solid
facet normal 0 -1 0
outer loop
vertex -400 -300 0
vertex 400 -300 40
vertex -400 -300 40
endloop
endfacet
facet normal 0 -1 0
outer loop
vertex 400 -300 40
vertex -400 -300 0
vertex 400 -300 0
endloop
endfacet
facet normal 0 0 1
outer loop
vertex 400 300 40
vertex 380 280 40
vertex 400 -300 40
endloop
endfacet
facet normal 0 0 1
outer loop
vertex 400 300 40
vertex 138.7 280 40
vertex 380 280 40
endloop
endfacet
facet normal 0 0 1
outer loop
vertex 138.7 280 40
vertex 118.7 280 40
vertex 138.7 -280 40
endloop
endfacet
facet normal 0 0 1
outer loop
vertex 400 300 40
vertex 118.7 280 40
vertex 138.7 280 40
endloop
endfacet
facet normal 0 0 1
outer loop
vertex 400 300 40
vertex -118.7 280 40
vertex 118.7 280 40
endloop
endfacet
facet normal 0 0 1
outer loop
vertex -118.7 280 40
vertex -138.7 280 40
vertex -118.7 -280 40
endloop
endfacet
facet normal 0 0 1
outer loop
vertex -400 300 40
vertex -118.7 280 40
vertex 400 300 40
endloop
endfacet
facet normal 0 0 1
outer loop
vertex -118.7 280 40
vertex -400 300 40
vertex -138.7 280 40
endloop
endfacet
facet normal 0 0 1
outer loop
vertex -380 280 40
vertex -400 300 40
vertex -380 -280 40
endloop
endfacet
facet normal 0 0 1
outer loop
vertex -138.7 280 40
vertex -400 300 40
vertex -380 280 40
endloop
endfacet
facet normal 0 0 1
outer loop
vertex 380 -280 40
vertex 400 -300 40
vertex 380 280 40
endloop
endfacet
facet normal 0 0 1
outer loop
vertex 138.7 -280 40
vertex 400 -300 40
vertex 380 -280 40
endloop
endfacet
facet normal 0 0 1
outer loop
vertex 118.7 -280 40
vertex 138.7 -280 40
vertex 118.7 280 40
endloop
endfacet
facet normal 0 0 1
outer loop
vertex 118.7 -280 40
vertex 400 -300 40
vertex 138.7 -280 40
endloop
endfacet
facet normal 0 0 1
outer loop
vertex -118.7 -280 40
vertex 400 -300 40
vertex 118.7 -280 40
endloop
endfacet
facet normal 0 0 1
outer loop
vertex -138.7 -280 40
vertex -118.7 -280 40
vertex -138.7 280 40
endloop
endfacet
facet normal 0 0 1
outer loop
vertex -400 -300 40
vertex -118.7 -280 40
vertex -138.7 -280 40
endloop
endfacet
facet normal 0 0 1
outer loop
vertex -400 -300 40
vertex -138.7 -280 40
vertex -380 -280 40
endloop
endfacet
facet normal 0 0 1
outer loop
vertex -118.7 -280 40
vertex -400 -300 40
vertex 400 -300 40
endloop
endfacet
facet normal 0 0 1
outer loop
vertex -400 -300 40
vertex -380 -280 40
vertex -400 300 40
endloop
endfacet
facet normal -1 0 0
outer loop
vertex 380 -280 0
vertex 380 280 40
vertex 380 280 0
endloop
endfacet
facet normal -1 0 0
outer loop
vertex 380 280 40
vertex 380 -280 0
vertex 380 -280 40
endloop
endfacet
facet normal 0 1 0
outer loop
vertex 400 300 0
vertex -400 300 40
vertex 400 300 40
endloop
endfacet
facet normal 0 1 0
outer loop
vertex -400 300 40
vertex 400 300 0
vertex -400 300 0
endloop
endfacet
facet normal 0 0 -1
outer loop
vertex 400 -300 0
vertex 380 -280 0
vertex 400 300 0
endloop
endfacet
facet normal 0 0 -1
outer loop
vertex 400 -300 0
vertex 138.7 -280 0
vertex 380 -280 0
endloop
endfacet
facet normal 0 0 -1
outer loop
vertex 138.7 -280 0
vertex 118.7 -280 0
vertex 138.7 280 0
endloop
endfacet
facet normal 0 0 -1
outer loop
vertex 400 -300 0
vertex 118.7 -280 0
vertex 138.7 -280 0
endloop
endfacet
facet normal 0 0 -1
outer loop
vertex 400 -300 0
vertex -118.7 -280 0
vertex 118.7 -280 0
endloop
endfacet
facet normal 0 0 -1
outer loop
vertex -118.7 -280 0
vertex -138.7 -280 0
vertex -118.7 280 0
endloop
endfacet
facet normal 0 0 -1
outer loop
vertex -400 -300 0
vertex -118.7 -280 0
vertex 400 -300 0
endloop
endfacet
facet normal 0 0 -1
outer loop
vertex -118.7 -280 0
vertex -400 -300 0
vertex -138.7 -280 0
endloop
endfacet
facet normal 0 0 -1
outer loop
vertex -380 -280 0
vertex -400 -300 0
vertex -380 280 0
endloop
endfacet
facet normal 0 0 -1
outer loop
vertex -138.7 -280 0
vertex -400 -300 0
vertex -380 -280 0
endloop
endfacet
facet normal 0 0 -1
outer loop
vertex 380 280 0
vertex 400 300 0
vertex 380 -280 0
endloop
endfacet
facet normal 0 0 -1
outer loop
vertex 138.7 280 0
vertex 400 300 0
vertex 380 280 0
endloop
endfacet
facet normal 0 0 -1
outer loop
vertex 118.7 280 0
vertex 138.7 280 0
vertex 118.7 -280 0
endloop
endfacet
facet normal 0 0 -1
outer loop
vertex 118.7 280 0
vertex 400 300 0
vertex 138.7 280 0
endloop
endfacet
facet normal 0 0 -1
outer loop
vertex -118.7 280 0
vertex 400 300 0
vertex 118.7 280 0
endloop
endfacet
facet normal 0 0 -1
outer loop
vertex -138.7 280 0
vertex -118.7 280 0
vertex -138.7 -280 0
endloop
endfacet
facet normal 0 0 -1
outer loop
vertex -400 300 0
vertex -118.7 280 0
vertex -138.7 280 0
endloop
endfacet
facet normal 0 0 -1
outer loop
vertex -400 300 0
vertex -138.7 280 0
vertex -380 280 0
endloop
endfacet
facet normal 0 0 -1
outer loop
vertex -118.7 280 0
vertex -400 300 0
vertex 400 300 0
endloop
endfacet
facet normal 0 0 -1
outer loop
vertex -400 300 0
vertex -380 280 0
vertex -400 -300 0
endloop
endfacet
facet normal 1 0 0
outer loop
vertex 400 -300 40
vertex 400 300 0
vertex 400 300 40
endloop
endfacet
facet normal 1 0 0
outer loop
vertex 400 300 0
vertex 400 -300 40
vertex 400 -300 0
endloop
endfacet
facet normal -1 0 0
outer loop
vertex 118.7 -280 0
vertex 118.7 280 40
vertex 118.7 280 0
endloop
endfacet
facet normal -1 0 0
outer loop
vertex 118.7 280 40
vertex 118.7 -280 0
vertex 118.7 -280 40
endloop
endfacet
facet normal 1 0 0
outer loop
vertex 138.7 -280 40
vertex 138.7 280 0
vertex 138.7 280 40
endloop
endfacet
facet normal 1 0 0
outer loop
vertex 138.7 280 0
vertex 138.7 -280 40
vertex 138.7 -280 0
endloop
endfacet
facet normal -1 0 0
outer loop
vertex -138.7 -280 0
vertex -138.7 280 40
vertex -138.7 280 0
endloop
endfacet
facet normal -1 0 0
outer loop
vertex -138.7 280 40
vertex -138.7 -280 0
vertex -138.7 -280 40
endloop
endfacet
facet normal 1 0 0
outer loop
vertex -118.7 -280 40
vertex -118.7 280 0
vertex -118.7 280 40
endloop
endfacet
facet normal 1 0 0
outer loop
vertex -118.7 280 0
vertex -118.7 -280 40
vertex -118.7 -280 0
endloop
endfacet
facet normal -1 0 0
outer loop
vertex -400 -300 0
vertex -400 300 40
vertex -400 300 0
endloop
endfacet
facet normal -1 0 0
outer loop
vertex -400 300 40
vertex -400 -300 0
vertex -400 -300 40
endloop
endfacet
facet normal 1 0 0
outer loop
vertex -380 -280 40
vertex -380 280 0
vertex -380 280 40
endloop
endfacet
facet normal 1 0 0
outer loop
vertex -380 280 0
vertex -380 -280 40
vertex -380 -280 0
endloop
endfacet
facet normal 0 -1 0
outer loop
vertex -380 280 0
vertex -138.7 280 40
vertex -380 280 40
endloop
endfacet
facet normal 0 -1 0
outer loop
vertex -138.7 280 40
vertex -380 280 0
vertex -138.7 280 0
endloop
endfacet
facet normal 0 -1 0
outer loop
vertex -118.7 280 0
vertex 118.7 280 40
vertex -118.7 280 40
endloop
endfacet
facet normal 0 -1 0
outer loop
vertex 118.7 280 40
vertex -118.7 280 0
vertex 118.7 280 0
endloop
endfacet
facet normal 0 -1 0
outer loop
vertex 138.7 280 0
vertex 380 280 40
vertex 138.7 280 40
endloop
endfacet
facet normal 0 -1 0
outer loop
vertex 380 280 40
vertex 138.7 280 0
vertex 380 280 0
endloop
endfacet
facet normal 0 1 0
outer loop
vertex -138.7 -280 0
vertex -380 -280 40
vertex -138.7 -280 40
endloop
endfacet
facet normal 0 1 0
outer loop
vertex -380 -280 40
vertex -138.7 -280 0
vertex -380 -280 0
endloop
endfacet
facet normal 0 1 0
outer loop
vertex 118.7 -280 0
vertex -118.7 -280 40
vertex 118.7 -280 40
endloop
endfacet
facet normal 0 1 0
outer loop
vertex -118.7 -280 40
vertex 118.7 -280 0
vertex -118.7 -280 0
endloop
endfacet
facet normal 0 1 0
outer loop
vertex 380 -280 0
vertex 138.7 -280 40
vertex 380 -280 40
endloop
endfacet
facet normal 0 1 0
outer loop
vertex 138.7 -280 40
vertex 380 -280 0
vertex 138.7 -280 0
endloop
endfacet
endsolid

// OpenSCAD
module Chassis01(lod=0, length=800, width=600, tube_profile=[40,20], bottom_align=false){
    if (lod==0){
        translate( (bottom_align) ? [0,0,tube_profile[0]/2]:[0,0,0]) {
            for (l=[1, 0.33, -0.33, -1]) {
                translate(l*[(length/2-tube_profile[1]/2),0,0])
                rotate([0, 90, 90])
                linear_extrude(height=width, center=true)
                square(tube_profile, center=true);
            }
            
            for (w=[1, -1]) {
                translate(w*[0,(width/2-tube_profile[1]/2),0])
                rotate([0, 90, 0])
                linear_extrude(height=length, center=true)
                square(tube_profile, center=true);
            }
        }
    }
}

Chassis01(bottom_align=true);
